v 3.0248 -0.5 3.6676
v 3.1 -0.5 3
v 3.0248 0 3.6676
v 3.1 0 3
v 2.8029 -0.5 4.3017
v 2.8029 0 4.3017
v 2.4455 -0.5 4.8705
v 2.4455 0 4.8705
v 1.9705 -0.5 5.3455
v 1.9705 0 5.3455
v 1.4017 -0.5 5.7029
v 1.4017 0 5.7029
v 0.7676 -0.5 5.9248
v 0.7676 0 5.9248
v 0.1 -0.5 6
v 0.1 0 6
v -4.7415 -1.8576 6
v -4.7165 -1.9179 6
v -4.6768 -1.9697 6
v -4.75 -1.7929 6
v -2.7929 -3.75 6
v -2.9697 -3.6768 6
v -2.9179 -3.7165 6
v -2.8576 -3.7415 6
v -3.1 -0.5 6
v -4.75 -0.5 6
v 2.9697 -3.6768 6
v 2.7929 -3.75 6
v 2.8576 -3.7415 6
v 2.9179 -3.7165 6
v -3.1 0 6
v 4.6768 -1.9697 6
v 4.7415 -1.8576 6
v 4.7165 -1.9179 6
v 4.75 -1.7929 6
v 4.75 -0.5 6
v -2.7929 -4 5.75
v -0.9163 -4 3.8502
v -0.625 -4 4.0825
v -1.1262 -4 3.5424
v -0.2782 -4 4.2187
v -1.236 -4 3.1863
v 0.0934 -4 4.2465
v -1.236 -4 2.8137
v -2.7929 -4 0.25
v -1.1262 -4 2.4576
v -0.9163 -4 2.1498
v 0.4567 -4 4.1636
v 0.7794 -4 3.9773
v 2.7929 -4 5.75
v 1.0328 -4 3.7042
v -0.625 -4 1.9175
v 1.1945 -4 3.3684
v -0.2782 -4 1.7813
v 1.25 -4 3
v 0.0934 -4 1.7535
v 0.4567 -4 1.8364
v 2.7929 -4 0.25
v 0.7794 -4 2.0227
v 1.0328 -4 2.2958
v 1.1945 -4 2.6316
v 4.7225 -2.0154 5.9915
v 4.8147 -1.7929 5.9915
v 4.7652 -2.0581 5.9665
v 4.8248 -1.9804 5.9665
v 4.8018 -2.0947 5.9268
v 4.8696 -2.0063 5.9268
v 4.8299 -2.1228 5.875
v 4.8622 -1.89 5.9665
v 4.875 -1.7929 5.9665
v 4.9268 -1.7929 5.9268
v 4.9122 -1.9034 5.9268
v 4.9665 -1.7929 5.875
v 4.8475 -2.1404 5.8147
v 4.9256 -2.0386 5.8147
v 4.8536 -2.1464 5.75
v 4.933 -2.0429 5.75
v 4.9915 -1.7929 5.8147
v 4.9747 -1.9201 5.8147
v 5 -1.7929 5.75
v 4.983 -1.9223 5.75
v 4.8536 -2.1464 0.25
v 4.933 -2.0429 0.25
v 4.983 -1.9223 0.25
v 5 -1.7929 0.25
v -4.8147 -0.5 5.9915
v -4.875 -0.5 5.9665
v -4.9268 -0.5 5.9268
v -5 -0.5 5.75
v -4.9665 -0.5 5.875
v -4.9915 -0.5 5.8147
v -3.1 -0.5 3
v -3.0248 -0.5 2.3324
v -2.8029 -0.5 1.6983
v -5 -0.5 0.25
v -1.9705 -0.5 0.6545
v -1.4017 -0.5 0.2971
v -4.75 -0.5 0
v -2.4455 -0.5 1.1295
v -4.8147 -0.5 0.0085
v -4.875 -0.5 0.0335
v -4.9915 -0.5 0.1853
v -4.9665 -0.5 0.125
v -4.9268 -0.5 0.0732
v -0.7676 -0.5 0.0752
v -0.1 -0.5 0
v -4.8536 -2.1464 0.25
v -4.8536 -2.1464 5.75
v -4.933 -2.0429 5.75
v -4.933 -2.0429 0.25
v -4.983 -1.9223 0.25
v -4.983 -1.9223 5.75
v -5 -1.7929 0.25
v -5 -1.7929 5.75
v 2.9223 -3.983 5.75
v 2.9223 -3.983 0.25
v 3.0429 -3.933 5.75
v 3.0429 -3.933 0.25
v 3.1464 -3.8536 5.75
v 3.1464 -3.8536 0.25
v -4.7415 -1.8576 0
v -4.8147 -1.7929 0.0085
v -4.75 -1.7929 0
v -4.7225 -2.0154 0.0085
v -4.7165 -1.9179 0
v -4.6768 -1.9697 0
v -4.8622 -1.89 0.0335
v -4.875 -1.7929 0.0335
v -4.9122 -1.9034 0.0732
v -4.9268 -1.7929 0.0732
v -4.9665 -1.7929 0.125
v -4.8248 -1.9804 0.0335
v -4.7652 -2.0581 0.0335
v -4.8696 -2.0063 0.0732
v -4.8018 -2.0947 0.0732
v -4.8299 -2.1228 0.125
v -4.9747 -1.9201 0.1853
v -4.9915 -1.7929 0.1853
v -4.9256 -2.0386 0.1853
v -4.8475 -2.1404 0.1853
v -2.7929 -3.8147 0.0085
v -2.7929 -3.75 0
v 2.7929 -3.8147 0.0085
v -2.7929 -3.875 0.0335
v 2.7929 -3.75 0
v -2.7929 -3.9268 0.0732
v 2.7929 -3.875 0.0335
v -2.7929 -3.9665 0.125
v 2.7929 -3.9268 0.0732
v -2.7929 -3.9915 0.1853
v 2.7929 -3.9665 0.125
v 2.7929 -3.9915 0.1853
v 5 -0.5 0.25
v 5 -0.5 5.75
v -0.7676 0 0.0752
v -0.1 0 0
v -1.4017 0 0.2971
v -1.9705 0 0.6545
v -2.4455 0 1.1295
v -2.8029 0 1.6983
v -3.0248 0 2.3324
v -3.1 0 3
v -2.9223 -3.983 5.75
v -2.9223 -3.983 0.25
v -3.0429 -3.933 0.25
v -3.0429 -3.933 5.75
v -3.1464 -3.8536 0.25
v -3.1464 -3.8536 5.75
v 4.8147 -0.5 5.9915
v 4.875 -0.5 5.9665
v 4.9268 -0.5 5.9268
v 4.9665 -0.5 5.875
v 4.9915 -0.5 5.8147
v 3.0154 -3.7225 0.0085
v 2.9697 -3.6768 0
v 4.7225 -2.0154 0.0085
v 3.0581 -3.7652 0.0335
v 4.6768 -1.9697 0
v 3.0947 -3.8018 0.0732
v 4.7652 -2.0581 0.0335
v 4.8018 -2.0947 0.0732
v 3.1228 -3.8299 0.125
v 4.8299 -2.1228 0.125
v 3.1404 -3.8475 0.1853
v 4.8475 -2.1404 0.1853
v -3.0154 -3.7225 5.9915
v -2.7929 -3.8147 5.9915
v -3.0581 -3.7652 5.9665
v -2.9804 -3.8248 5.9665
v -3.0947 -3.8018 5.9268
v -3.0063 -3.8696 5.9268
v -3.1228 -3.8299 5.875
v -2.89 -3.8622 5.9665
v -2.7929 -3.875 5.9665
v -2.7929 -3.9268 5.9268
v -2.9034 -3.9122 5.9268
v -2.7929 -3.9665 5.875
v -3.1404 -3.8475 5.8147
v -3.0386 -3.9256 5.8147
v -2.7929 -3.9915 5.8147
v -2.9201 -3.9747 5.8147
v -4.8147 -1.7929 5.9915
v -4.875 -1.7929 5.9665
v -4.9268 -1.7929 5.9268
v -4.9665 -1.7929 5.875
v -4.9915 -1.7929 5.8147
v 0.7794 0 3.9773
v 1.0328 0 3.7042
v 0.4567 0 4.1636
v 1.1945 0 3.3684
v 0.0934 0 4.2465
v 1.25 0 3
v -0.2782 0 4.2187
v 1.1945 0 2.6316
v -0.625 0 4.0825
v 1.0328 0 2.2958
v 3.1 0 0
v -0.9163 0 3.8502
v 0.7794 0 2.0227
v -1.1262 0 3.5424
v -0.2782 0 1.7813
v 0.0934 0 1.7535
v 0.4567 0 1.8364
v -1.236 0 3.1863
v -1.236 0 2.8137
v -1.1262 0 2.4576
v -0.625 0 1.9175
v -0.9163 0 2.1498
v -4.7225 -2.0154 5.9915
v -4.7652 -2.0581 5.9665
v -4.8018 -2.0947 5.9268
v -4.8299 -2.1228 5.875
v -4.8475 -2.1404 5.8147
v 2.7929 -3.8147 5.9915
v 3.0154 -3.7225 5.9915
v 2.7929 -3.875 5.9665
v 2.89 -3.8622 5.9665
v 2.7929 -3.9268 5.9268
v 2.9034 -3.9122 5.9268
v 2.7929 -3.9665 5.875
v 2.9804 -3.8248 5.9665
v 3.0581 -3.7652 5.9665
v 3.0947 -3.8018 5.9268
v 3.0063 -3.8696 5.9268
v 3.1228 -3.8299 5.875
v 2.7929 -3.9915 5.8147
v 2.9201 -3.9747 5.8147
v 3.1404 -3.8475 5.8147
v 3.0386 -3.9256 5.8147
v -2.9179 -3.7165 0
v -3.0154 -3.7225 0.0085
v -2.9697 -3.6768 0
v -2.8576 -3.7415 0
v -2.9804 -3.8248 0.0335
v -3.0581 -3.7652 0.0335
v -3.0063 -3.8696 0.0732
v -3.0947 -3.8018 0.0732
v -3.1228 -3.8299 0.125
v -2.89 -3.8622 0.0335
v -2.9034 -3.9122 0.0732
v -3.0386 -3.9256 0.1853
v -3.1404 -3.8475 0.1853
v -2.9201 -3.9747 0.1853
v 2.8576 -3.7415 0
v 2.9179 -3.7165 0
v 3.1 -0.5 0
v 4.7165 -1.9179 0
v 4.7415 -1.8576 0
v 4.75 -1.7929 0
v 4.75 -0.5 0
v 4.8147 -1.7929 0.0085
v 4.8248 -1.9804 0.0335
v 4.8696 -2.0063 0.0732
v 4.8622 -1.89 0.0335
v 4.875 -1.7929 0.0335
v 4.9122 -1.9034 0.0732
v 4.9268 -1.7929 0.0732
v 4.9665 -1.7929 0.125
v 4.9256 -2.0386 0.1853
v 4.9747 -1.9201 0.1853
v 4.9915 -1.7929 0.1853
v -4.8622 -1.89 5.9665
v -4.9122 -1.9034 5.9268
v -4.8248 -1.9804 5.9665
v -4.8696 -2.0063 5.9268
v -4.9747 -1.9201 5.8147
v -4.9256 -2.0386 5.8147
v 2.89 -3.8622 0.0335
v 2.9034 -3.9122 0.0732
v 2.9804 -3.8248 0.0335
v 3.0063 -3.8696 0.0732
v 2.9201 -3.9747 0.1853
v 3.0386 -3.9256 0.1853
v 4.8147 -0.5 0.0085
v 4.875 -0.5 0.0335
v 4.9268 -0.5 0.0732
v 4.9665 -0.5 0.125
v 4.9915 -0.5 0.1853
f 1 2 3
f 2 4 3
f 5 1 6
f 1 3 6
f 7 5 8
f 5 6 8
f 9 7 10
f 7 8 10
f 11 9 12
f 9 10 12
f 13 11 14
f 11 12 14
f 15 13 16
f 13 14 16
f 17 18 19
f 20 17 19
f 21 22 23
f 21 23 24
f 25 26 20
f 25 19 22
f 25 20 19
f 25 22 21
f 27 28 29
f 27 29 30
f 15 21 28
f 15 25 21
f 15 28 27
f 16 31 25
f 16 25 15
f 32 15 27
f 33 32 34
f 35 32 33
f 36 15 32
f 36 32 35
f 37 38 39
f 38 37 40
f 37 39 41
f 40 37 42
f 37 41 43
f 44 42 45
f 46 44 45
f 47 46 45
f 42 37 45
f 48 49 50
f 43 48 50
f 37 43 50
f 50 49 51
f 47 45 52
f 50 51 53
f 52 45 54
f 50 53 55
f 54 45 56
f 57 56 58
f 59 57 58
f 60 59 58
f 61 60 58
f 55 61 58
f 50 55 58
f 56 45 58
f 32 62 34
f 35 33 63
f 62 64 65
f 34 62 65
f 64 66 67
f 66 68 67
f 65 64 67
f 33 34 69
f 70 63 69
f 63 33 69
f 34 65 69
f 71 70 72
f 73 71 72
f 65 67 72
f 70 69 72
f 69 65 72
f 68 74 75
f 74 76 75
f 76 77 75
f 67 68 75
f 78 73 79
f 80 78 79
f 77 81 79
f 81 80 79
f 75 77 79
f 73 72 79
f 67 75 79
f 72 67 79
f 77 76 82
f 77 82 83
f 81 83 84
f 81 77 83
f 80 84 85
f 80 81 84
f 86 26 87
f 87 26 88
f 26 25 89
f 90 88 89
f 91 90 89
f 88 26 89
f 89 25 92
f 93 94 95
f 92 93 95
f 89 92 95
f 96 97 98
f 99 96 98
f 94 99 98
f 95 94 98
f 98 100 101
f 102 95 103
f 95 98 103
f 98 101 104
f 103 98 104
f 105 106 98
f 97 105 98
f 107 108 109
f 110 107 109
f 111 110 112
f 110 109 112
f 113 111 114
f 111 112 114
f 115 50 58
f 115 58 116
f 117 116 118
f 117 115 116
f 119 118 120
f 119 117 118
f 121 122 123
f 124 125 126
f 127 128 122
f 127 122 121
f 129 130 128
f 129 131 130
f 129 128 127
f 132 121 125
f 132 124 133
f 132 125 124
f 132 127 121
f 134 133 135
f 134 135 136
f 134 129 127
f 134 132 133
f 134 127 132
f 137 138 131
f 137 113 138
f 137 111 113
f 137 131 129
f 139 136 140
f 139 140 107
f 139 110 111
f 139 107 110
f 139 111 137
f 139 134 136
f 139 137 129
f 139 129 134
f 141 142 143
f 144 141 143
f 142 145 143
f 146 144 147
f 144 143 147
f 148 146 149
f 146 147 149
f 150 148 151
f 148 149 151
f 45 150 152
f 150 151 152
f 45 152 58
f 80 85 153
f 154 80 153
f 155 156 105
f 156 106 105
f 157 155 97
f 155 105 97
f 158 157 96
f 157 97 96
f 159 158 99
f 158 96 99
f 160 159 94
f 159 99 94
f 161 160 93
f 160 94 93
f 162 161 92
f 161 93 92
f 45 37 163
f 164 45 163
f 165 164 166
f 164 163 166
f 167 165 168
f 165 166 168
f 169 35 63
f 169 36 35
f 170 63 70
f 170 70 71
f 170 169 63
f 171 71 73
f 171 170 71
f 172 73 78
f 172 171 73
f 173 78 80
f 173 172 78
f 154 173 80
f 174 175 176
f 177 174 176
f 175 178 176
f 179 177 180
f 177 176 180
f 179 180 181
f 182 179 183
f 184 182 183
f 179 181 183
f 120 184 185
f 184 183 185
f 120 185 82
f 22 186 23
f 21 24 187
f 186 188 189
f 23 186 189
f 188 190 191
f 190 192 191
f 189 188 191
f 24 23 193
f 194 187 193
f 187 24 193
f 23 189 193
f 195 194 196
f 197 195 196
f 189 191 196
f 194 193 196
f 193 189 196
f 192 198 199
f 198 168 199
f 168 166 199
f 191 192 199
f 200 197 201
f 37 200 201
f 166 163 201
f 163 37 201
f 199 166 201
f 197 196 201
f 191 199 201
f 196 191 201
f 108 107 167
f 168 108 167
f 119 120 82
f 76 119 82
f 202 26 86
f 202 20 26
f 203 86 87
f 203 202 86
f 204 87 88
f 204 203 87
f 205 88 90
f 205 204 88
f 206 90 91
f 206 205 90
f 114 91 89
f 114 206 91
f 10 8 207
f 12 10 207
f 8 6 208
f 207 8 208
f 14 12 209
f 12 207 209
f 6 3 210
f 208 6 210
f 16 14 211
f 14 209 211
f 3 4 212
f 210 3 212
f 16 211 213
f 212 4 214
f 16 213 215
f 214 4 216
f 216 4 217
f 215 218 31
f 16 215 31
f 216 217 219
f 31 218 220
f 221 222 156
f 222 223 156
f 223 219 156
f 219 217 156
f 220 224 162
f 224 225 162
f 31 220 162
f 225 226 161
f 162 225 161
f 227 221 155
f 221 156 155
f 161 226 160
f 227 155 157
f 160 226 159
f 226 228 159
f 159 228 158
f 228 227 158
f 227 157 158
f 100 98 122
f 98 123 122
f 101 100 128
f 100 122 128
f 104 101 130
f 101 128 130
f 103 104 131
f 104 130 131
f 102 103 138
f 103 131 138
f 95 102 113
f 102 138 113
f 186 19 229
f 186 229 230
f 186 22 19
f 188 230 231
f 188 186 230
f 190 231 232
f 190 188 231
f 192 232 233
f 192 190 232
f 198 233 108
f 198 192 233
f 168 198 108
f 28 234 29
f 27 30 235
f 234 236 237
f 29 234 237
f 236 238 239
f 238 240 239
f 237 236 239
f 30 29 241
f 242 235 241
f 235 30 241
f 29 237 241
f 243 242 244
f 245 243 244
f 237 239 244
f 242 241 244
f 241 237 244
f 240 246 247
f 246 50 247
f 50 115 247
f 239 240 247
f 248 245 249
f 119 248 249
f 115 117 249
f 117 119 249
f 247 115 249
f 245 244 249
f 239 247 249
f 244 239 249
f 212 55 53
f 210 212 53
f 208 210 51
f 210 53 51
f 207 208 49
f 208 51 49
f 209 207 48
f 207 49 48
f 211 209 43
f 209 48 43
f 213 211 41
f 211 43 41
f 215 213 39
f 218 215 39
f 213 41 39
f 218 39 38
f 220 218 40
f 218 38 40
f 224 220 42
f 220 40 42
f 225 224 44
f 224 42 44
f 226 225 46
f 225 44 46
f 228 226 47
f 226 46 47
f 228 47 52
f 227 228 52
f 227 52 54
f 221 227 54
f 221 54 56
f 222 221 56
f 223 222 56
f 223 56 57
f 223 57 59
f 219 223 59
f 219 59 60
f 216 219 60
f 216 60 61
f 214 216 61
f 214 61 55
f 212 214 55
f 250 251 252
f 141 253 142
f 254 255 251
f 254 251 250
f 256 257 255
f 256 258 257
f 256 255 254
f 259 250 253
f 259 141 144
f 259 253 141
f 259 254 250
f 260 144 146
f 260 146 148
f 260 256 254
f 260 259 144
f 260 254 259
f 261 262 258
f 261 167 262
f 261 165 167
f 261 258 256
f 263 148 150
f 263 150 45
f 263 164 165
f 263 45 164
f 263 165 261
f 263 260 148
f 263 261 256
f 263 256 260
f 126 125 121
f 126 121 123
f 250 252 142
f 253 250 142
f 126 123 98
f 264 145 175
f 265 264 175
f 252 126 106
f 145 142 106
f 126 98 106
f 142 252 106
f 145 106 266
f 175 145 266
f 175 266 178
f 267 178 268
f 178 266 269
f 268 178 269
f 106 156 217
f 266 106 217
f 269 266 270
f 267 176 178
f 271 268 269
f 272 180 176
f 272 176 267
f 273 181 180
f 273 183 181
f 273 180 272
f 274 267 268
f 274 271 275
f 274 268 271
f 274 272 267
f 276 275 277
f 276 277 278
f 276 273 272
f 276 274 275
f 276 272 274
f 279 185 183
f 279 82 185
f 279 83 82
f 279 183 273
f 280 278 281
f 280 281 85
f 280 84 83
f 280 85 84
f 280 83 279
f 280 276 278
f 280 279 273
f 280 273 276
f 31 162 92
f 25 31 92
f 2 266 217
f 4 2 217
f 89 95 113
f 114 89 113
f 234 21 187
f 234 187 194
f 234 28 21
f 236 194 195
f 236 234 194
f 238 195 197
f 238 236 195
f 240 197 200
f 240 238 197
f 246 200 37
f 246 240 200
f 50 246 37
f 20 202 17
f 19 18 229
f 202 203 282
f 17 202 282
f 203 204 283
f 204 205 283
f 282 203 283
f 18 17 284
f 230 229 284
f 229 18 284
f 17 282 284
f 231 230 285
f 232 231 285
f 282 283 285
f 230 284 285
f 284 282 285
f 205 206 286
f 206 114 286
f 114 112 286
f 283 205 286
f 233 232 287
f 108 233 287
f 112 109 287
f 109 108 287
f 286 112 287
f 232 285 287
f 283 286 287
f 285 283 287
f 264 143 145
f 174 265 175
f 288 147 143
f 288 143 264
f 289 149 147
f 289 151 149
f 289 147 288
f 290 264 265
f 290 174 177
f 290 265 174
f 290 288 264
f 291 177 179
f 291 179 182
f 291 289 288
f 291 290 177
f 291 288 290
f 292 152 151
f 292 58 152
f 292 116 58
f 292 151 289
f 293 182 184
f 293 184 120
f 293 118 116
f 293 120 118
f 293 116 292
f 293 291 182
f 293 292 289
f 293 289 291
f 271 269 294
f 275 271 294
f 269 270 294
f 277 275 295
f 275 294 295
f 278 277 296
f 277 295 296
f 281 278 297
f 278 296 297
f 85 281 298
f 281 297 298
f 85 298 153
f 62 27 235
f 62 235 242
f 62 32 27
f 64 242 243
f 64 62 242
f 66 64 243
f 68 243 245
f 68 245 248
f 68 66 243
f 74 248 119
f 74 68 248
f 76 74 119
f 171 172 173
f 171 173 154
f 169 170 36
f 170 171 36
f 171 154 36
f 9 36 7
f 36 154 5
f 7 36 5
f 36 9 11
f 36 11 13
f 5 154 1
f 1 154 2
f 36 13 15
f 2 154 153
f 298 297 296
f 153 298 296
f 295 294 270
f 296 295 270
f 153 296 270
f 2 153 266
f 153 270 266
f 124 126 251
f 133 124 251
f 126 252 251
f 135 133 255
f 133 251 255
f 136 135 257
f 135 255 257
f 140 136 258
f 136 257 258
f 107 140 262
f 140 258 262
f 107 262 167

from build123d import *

# Parameters (mm, degrees)
BOSS_EXTRUDE1_DEPTH = 6
M3_TAPPED_HOLE1_D   = 2.5
FILLET1_R           = 3
FILLET2_R           = 0.5
FILLET3_R           = 0.25


with BuildPart() as part:
    # Sketch1 → Boss-Extrude1 (new body)
    with BuildSketch(Plane.XY):
        Polygon((3.1, 0), (-3.1, 0), (-3.1, -0.5), (-5, -0.5), (-5, -2), (-3, -4), (3, -4), (5, -2), (5, -0.5), (3.1, -0.5), align=None)
    extrude(amount=BOSS_EXTRUDE1_DEPTH)

    # M3 Tapped Hole1 (through all)
    with Locations(Plane(origin=(0, 0, 0), x_dir=(-1, 0, 0), z_dir=(0, 1, 0))):
        with Locations((0, 3)):
            Hole(M3_TAPPED_HOLE1_D / 2)

    # Fillet1
    fillet1_edges = [part.edges().sort_by_distance(p)[0] for p in [
        (-3.1, -0.25, 0),
        (3.1, -0.25, 6),
    ]]
    fillet(fillet1_edges, radius=FILLET1_R)

    # Fillet2
    fillet2_edges = [part.edges().sort_by_distance(p)[0] for p in [
        (5, -2, 3),
        (3, -4, 3),
        (-3, -4, 3),
        (-5, -2, 3),
    ]]
    fillet(fillet2_edges, radius=FILLET2_R)

    # Fillet3
    fillet3_edges = [part.edges().sort_by_distance(p)[0] for p in [
        (-5, -1.146446609, 6),
        (-5, -1.146446609, 0),
        (5, -1.146446609, 0),
        (5, -1.146446609, 6),
        (4, -3, 0),
        (0, -4, 0),
        (-4, -3, 0),
        (-2.984234935, -3.961939766, 0),
        (-4.961939766, -1.984234935, 0),
        (2.984234935, -3.961939766, 0),
        (4.961939766, -1.984234935, 0),
        (4, -3, 6),
        (-4, -3, 6),
        (0, -4, 6),
        (-2.984234935, -3.961939766, 6),
        (-4.961939766, -1.984234935, 6),
        (2.984234935, -3.961939766, 6),
        (4.961939766, -1.984234935, 6),
    ]]
    fillet(fillet3_edges, radius=FILLET3_R)


solid = part.part
